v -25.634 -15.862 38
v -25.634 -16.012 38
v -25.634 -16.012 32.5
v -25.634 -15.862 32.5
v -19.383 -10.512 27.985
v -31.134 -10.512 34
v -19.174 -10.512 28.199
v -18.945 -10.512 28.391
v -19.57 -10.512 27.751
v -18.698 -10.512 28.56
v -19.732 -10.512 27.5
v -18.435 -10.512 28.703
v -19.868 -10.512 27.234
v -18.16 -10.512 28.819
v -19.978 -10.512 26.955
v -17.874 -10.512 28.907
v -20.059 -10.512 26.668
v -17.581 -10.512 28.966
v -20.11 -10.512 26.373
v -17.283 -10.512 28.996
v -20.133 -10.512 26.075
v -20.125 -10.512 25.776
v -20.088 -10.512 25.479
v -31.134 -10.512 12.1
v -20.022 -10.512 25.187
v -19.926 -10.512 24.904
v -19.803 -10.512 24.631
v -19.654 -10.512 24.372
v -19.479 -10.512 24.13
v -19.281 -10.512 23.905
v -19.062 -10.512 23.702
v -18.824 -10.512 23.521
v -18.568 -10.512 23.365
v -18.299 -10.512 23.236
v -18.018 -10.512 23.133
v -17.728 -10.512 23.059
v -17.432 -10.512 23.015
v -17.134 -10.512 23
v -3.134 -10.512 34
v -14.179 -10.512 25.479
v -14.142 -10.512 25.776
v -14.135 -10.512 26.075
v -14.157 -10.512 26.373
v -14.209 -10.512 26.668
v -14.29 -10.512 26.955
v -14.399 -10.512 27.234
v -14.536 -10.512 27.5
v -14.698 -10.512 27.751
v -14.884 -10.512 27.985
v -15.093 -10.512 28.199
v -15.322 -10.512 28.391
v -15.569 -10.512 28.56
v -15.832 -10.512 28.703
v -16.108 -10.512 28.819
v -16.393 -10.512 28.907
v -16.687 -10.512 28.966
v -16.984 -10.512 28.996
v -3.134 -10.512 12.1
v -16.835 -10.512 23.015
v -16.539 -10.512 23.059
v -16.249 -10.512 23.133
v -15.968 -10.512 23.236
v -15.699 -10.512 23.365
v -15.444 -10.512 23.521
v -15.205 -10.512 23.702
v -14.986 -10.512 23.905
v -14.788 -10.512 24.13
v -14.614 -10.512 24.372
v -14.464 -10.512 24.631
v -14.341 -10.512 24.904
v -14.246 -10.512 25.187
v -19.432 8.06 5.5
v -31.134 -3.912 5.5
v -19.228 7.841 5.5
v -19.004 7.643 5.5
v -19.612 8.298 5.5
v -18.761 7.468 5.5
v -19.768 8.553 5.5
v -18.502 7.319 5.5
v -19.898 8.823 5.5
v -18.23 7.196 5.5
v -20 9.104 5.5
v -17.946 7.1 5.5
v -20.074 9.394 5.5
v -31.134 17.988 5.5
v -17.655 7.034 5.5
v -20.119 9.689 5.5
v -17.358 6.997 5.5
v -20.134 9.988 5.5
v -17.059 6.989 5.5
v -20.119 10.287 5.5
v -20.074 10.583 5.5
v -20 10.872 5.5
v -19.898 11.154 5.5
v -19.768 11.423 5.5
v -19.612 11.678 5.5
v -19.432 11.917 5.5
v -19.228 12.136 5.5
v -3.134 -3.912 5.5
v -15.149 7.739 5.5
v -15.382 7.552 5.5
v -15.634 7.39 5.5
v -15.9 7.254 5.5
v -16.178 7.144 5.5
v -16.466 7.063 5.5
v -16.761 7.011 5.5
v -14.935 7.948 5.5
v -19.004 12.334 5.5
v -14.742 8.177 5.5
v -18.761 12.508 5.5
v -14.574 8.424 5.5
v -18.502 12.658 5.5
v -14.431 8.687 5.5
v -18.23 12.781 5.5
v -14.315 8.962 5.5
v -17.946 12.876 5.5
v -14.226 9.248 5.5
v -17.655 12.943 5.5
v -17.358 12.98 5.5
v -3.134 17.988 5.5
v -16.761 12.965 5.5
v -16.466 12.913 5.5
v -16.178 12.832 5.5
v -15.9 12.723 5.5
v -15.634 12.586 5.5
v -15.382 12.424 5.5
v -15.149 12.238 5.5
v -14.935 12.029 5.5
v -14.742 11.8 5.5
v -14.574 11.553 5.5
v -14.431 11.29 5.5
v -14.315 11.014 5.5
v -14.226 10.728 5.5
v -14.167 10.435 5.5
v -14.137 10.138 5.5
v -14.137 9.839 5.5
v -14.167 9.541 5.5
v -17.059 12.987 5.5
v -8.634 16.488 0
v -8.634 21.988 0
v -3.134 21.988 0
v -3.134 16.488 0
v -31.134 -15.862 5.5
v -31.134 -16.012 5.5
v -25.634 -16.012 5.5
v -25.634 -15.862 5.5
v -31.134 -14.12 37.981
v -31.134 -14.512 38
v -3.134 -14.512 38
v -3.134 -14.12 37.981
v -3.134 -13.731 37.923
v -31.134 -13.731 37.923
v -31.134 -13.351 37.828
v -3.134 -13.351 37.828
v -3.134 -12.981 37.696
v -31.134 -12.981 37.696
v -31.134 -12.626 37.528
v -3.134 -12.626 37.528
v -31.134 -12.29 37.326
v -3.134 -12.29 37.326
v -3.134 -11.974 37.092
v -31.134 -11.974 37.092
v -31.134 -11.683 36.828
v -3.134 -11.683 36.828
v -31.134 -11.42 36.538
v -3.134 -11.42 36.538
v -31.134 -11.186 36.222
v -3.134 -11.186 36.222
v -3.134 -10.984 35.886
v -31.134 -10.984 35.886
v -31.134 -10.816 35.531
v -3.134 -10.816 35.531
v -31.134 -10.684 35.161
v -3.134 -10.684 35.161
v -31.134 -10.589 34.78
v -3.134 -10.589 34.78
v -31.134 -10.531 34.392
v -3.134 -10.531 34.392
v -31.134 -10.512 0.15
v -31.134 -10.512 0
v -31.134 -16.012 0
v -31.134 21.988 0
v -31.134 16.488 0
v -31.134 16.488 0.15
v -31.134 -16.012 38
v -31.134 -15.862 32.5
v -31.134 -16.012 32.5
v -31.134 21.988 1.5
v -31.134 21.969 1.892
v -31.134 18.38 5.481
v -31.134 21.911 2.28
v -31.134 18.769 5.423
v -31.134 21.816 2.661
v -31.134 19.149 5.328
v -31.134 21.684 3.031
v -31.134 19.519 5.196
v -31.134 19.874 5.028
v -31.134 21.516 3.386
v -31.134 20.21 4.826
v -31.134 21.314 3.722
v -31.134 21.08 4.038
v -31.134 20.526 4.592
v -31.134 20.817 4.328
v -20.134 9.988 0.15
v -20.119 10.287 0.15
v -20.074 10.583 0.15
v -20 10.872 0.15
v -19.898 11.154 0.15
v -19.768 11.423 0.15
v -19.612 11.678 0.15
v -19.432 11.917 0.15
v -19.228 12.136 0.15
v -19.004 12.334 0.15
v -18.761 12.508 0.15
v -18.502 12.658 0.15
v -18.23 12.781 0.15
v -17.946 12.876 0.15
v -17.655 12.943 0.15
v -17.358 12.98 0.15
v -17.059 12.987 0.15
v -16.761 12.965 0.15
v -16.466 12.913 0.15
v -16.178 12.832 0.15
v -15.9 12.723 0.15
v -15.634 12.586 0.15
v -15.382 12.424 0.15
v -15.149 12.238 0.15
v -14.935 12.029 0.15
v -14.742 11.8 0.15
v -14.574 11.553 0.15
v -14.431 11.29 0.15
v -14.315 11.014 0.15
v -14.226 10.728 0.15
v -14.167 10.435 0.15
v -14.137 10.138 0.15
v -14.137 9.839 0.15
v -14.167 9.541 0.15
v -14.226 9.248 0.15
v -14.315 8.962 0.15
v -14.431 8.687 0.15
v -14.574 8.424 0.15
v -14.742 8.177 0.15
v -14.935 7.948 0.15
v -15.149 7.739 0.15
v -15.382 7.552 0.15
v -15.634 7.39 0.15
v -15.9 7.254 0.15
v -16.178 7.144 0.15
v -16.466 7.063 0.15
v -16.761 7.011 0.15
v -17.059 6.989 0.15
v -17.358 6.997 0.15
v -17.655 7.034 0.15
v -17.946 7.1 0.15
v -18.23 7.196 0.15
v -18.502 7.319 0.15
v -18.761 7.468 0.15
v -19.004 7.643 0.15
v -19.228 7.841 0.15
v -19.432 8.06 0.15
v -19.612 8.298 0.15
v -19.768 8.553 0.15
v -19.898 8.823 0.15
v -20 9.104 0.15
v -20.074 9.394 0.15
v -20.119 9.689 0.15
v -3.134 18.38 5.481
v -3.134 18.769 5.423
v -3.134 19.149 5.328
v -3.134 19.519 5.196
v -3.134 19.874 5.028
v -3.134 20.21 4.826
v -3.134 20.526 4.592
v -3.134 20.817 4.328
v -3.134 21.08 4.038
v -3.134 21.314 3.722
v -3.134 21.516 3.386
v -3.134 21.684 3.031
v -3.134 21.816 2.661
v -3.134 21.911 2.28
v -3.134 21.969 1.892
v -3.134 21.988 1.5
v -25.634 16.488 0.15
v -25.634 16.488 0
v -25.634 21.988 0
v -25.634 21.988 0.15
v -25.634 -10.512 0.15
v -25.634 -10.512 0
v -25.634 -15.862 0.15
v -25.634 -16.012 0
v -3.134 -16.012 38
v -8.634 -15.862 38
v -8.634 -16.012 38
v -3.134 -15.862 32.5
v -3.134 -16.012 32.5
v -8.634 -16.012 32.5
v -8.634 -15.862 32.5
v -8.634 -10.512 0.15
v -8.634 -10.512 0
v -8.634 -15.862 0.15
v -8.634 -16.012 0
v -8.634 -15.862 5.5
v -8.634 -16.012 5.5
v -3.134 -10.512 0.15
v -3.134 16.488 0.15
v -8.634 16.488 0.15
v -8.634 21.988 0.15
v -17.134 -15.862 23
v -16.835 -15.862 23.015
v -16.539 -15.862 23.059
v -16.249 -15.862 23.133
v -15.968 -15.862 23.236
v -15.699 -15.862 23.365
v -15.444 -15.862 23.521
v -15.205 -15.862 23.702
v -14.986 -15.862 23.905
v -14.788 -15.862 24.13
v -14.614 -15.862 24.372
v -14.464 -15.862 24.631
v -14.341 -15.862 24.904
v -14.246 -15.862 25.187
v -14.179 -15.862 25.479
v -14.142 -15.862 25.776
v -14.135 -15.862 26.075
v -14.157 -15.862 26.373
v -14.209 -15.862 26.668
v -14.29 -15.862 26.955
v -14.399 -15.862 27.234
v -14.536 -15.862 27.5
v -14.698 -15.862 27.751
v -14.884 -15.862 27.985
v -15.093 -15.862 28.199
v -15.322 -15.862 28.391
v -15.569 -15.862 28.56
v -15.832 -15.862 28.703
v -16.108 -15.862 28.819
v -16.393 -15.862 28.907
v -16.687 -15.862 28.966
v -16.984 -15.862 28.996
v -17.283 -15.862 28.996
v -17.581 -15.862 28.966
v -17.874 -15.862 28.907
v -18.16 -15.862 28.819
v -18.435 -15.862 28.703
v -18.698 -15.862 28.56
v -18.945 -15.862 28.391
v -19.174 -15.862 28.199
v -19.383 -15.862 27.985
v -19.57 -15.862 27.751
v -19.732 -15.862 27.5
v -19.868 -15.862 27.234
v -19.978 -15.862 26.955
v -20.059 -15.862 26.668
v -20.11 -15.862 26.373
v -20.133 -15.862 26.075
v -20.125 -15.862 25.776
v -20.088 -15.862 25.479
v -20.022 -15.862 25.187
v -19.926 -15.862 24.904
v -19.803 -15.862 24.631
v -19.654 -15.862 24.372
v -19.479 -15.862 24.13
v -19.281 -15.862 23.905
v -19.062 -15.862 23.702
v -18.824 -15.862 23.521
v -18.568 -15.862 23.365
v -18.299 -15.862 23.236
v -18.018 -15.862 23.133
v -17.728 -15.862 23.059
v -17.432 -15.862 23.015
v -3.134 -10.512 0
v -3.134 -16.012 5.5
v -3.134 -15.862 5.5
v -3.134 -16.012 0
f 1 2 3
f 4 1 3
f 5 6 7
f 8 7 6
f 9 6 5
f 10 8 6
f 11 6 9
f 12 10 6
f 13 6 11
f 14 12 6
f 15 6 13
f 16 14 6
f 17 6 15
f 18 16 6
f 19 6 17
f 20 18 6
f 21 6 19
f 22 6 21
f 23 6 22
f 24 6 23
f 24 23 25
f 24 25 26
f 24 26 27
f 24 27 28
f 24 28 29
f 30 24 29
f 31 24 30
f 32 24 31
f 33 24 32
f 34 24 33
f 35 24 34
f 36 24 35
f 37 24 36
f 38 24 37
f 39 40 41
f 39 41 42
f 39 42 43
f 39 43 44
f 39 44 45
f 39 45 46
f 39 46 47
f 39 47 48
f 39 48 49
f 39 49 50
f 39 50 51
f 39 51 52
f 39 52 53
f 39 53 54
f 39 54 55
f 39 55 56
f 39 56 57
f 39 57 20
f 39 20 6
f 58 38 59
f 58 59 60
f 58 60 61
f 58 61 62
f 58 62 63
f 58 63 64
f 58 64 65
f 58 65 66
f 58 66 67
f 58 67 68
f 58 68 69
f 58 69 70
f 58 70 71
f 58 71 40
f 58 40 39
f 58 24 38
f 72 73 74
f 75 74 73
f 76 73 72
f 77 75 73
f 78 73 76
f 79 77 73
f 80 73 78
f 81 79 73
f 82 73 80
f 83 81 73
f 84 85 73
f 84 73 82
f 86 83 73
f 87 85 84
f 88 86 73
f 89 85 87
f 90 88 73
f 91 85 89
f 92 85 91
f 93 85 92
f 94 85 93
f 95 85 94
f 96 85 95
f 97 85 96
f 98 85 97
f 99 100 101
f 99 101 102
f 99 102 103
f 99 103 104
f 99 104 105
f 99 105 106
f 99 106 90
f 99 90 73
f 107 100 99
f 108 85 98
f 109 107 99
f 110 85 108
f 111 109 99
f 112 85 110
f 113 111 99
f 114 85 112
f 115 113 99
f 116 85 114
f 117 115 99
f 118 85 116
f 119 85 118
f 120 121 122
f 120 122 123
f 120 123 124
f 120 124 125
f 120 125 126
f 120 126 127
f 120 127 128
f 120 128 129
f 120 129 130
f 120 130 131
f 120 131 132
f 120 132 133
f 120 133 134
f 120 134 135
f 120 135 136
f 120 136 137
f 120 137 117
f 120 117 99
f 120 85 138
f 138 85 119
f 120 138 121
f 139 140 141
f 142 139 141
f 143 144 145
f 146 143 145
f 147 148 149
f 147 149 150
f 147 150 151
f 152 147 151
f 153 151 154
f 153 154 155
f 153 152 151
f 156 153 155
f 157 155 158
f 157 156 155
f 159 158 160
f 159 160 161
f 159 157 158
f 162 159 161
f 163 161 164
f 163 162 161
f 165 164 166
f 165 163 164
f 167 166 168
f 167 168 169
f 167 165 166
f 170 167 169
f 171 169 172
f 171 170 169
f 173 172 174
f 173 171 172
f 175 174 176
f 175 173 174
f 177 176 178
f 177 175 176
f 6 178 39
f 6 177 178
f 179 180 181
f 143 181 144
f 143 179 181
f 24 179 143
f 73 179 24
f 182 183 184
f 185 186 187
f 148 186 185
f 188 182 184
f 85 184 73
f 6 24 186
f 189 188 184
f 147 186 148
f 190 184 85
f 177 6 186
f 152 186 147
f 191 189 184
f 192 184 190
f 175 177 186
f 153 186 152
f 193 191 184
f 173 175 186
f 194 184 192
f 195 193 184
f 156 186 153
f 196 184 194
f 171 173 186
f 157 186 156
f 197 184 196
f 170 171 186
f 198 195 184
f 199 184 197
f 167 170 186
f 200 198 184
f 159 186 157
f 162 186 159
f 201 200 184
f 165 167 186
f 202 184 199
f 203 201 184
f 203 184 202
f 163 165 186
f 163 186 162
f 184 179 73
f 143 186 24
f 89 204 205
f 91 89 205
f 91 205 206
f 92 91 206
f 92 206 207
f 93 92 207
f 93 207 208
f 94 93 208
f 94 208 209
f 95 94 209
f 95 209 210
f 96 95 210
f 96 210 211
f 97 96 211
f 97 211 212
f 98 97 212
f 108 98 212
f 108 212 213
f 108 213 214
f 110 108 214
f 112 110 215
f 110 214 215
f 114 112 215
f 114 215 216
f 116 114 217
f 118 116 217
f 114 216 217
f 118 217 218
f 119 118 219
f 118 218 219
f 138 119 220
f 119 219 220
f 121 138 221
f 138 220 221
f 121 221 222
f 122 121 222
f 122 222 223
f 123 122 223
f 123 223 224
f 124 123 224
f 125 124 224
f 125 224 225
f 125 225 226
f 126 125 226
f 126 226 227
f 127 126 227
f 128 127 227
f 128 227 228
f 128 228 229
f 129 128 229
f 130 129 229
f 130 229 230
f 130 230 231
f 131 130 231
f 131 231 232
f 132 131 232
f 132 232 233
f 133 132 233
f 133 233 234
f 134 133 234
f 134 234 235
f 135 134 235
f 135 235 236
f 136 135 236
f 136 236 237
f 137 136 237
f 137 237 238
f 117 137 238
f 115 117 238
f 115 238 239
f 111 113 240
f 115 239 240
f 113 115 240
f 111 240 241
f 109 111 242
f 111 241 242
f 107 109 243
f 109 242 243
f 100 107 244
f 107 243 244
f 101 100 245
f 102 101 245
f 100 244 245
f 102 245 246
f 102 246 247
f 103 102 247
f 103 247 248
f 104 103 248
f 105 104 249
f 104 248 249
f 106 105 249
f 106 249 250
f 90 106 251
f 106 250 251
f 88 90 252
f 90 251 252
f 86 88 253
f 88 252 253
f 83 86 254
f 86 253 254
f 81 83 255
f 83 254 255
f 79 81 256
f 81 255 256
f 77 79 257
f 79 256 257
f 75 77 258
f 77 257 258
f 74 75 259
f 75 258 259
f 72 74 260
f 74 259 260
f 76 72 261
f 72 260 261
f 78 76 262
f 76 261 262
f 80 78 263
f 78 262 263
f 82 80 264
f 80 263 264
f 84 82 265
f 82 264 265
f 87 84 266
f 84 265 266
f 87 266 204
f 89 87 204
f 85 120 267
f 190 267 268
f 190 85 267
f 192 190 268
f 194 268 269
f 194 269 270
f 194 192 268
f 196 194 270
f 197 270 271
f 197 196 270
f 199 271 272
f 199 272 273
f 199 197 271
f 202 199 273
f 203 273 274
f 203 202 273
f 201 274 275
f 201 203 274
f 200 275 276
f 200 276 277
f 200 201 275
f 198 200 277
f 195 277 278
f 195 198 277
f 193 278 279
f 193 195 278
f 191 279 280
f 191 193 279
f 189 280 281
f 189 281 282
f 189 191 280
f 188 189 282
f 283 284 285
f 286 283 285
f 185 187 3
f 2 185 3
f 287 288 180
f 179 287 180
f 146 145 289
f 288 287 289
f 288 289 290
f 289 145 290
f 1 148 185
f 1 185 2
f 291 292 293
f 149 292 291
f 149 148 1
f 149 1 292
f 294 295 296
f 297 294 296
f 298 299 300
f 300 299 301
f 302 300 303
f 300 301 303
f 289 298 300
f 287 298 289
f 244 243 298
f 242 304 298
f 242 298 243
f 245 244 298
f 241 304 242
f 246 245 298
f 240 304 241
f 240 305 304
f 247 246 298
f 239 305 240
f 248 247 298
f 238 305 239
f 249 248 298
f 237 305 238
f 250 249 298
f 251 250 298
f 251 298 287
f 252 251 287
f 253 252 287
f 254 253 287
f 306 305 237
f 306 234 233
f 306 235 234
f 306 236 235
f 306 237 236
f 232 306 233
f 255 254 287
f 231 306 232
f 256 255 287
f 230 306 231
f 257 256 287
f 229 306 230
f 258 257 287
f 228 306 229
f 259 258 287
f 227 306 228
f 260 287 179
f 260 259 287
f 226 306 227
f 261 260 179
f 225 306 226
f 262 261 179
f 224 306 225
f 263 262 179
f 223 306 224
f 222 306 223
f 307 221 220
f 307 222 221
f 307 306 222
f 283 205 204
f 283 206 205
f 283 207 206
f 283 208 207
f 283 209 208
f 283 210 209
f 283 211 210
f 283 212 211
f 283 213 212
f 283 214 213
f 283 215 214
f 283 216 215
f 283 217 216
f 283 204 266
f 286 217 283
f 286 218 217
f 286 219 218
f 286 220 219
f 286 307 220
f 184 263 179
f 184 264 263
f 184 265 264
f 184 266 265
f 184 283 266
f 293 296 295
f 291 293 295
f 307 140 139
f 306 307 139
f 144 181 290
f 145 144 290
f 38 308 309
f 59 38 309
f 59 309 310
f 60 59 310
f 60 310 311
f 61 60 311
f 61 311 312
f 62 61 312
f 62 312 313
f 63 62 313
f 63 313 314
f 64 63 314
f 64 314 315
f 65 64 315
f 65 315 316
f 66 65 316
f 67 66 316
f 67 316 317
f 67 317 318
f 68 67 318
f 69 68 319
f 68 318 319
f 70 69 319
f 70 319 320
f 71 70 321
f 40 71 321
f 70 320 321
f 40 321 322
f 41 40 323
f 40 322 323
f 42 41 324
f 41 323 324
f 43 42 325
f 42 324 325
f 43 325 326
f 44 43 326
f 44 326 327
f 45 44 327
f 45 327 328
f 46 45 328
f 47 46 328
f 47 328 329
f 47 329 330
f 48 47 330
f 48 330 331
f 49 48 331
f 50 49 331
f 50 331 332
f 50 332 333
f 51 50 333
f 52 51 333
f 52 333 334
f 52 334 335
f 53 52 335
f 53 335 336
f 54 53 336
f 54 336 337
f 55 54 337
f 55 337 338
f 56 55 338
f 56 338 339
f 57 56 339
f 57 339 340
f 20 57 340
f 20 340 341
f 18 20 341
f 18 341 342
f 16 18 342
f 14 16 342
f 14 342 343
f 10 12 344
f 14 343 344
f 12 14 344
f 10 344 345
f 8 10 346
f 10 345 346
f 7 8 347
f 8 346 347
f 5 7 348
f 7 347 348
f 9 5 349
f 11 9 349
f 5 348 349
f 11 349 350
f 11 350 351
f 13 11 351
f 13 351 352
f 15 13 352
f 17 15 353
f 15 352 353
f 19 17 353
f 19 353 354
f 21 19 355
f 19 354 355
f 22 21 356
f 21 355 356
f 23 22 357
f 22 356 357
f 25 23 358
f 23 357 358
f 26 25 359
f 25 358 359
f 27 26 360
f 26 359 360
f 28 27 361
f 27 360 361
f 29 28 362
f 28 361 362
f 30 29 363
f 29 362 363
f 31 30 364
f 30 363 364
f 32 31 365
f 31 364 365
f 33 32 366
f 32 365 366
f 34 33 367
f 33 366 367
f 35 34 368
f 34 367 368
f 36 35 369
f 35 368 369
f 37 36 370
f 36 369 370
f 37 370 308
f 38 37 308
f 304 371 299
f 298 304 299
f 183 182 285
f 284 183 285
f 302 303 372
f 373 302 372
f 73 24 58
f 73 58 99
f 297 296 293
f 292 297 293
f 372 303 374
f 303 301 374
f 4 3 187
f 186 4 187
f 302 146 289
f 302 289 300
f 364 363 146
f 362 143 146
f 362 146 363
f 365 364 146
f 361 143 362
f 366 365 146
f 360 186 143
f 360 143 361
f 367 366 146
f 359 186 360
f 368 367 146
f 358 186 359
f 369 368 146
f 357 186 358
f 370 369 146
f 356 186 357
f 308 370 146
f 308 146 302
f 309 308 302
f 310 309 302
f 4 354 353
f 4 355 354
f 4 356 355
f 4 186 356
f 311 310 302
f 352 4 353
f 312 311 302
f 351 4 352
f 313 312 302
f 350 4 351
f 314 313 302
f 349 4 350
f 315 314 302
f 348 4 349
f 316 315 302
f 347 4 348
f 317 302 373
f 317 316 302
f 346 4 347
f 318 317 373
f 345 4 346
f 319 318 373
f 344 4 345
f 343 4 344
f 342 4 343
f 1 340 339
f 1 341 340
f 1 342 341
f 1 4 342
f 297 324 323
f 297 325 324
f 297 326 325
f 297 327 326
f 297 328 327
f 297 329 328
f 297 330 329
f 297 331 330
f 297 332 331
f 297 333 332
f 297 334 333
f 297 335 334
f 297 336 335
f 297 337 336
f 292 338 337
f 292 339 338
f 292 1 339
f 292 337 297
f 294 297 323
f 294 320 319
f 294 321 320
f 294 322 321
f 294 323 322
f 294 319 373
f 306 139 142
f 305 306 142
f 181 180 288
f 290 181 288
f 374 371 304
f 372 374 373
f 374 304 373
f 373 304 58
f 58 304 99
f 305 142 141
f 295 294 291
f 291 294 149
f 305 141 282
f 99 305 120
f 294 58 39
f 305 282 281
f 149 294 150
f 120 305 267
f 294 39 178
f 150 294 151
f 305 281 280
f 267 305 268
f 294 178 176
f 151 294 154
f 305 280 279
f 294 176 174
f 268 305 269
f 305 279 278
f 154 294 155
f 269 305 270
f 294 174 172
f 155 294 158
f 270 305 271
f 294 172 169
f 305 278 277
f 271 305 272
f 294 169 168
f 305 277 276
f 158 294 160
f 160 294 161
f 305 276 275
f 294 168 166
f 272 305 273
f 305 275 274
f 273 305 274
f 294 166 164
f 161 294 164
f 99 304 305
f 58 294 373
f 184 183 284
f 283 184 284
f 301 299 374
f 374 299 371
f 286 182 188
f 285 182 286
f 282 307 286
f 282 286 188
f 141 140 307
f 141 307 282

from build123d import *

# Parameters (mm, degrees)
ESBO_O1_W                = 28
ESBO_O1_H                = 38
RESSALTO_EXTRUS_O1_DEPTH = 5.5
ESBO_O2_W                = 28
ESBO_O2_H                = 5.5
RESSALTO_EXTRUS_O2_DEPTH = 32.5
CORTE_EXTRUS_O1_DEPTH    = 28
RESSALTO_EXTRUS_O3_DEPTH = 28
CORTE_EXTRUS_O2_DEPTH    = 0.15
CORTE_EXTRUS_O3_DEPTH    = 0.15
ESBO_O8_R                = 3
CORTE_EXTRUS_O4_DEPTH    = 6
ESBO_O9_R                = 3
CORTE_EXTRUS_O5_DEPTH    = 6


with BuildPart() as part:
    # Esboço1 → Ressalto-extrusão1 (new body)
    with BuildSketch(Plane.XY):
        with Locations((-17.133729377, 2.988196373)):
            Rectangle(ESBO_O1_W, ESBO_O1_H)
    extrude(amount=RESSALTO_EXTRUS_O1_DEPTH)

    # Esboço2 → Ressalto-extrusão2 (add)
    with BuildSketch(Plane.XY.offset(5.5)):
        with Locations((-17.133729377, -13.261803627)):
            Rectangle(ESBO_O2_W, ESBO_O2_H)
    extrude(amount=RESSALTO_EXTRUS_O2_DEPTH)

    # Esboço3 → Corte-extrusão1 (cut)
    with BuildSketch(Plane.ZY.offset(31.133729377)):
        with BuildLine():
            Line((1.5, 21.988196373), (5.5, 21.988196373))
            Line((5.5, 21.988196373), (5.5, 17.988196373))
            ThreePointArc((5.5, 17.988196373), (4.328427125, 20.816623498), (1.5, 21.988196373))
        make_face()
        with BuildLine():
            Line((34, -10.511803627), (38, -10.511803627))
            Line((38, -10.511803627), (38, -14.511803627))
            ThreePointArc((38, -14.511803627), (36.828427125, -11.683376502), (34, -10.511803627))
        make_face()
    extrude(amount=-CORTE_EXTRUS_O1_DEPTH, mode=Mode.SUBTRACT)

    # Esboço4 → Ressalto-extrusão3 (add)
    with BuildSketch(Plane.ZY.offset(31.133729377)):
        Polygon((5.5, -10.511803627), (12.1, -10.511803627), (5.5, -3.911803627), align=None)
    extrude(amount=-RESSALTO_EXTRUS_O3_DEPTH)

    # Esboço5 → Corte-extrusão2 (cut)
    with BuildSketch(Plane.XZ.offset(16.011803627)):
        Polygon((-25.633729377, 5.5), (-25.633729377, 0), (-8.633729377, 0), (-8.633729377, 5.5), (-3.133729377, 5.5), (-3.133729377, 32.5), (-8.633729377, 32.5), (-8.633729377, 38), (-25.633729377, 38), (-25.633729377, 32.5), (-31.133729377, 32.5), (-31.133729377, 5.5), align=None)
    extrude(amount=-CORTE_EXTRUS_O2_DEPTH, mode=Mode.SUBTRACT)

    # Esboço6 → Corte-extrusão3 (cut)
    with BuildSketch(Plane(origin=(0, 0, 0), x_dir=(-1, 0, 0), z_dir=(0, 0, -1))):
        Polygon((8.633729377, -10.511803627), (8.633729377, -15.861803627), (25.633729377, -15.861803627), (25.633729377, -10.511803627), (31.133729377, -10.511803627), (31.133729377, 16.488196373), (25.633729377, 16.488196373), (25.633729377, 21.988196373), (8.633729377, 21.988196373), (8.633729377, 16.488196373), (3.133729377, 16.488196373), (3.133729377, -10.511803627), align=None)
    extrude(amount=-CORTE_EXTRUS_O3_DEPTH, mode=Mode.SUBTRACT)

    # Esboço8 → Corte-extrusão4 (cut)
    with BuildSketch(Plane.XZ.offset(15.861803627)):
        with Locations(Location((-17.133729377, 26, 0), (0, 0, 270))):
            Circle(ESBO_O8_R)
    extrude(amount=-CORTE_EXTRUS_O4_DEPTH, mode=Mode.SUBTRACT)

    # Esboço9 → Corte-extrusão5 (cut)
    with BuildSketch(Plane(origin=(0, 0, 0.15), x_dir=(-1, 0, 0), z_dir=(0, 0, -1))):
        with Locations((17.133729377, 9.988196373)):
            Circle(ESBO_O9_R)
    extrude(amount=-CORTE_EXTRUS_O5_DEPTH, mode=Mode.SUBTRACT)


solid = part.part
